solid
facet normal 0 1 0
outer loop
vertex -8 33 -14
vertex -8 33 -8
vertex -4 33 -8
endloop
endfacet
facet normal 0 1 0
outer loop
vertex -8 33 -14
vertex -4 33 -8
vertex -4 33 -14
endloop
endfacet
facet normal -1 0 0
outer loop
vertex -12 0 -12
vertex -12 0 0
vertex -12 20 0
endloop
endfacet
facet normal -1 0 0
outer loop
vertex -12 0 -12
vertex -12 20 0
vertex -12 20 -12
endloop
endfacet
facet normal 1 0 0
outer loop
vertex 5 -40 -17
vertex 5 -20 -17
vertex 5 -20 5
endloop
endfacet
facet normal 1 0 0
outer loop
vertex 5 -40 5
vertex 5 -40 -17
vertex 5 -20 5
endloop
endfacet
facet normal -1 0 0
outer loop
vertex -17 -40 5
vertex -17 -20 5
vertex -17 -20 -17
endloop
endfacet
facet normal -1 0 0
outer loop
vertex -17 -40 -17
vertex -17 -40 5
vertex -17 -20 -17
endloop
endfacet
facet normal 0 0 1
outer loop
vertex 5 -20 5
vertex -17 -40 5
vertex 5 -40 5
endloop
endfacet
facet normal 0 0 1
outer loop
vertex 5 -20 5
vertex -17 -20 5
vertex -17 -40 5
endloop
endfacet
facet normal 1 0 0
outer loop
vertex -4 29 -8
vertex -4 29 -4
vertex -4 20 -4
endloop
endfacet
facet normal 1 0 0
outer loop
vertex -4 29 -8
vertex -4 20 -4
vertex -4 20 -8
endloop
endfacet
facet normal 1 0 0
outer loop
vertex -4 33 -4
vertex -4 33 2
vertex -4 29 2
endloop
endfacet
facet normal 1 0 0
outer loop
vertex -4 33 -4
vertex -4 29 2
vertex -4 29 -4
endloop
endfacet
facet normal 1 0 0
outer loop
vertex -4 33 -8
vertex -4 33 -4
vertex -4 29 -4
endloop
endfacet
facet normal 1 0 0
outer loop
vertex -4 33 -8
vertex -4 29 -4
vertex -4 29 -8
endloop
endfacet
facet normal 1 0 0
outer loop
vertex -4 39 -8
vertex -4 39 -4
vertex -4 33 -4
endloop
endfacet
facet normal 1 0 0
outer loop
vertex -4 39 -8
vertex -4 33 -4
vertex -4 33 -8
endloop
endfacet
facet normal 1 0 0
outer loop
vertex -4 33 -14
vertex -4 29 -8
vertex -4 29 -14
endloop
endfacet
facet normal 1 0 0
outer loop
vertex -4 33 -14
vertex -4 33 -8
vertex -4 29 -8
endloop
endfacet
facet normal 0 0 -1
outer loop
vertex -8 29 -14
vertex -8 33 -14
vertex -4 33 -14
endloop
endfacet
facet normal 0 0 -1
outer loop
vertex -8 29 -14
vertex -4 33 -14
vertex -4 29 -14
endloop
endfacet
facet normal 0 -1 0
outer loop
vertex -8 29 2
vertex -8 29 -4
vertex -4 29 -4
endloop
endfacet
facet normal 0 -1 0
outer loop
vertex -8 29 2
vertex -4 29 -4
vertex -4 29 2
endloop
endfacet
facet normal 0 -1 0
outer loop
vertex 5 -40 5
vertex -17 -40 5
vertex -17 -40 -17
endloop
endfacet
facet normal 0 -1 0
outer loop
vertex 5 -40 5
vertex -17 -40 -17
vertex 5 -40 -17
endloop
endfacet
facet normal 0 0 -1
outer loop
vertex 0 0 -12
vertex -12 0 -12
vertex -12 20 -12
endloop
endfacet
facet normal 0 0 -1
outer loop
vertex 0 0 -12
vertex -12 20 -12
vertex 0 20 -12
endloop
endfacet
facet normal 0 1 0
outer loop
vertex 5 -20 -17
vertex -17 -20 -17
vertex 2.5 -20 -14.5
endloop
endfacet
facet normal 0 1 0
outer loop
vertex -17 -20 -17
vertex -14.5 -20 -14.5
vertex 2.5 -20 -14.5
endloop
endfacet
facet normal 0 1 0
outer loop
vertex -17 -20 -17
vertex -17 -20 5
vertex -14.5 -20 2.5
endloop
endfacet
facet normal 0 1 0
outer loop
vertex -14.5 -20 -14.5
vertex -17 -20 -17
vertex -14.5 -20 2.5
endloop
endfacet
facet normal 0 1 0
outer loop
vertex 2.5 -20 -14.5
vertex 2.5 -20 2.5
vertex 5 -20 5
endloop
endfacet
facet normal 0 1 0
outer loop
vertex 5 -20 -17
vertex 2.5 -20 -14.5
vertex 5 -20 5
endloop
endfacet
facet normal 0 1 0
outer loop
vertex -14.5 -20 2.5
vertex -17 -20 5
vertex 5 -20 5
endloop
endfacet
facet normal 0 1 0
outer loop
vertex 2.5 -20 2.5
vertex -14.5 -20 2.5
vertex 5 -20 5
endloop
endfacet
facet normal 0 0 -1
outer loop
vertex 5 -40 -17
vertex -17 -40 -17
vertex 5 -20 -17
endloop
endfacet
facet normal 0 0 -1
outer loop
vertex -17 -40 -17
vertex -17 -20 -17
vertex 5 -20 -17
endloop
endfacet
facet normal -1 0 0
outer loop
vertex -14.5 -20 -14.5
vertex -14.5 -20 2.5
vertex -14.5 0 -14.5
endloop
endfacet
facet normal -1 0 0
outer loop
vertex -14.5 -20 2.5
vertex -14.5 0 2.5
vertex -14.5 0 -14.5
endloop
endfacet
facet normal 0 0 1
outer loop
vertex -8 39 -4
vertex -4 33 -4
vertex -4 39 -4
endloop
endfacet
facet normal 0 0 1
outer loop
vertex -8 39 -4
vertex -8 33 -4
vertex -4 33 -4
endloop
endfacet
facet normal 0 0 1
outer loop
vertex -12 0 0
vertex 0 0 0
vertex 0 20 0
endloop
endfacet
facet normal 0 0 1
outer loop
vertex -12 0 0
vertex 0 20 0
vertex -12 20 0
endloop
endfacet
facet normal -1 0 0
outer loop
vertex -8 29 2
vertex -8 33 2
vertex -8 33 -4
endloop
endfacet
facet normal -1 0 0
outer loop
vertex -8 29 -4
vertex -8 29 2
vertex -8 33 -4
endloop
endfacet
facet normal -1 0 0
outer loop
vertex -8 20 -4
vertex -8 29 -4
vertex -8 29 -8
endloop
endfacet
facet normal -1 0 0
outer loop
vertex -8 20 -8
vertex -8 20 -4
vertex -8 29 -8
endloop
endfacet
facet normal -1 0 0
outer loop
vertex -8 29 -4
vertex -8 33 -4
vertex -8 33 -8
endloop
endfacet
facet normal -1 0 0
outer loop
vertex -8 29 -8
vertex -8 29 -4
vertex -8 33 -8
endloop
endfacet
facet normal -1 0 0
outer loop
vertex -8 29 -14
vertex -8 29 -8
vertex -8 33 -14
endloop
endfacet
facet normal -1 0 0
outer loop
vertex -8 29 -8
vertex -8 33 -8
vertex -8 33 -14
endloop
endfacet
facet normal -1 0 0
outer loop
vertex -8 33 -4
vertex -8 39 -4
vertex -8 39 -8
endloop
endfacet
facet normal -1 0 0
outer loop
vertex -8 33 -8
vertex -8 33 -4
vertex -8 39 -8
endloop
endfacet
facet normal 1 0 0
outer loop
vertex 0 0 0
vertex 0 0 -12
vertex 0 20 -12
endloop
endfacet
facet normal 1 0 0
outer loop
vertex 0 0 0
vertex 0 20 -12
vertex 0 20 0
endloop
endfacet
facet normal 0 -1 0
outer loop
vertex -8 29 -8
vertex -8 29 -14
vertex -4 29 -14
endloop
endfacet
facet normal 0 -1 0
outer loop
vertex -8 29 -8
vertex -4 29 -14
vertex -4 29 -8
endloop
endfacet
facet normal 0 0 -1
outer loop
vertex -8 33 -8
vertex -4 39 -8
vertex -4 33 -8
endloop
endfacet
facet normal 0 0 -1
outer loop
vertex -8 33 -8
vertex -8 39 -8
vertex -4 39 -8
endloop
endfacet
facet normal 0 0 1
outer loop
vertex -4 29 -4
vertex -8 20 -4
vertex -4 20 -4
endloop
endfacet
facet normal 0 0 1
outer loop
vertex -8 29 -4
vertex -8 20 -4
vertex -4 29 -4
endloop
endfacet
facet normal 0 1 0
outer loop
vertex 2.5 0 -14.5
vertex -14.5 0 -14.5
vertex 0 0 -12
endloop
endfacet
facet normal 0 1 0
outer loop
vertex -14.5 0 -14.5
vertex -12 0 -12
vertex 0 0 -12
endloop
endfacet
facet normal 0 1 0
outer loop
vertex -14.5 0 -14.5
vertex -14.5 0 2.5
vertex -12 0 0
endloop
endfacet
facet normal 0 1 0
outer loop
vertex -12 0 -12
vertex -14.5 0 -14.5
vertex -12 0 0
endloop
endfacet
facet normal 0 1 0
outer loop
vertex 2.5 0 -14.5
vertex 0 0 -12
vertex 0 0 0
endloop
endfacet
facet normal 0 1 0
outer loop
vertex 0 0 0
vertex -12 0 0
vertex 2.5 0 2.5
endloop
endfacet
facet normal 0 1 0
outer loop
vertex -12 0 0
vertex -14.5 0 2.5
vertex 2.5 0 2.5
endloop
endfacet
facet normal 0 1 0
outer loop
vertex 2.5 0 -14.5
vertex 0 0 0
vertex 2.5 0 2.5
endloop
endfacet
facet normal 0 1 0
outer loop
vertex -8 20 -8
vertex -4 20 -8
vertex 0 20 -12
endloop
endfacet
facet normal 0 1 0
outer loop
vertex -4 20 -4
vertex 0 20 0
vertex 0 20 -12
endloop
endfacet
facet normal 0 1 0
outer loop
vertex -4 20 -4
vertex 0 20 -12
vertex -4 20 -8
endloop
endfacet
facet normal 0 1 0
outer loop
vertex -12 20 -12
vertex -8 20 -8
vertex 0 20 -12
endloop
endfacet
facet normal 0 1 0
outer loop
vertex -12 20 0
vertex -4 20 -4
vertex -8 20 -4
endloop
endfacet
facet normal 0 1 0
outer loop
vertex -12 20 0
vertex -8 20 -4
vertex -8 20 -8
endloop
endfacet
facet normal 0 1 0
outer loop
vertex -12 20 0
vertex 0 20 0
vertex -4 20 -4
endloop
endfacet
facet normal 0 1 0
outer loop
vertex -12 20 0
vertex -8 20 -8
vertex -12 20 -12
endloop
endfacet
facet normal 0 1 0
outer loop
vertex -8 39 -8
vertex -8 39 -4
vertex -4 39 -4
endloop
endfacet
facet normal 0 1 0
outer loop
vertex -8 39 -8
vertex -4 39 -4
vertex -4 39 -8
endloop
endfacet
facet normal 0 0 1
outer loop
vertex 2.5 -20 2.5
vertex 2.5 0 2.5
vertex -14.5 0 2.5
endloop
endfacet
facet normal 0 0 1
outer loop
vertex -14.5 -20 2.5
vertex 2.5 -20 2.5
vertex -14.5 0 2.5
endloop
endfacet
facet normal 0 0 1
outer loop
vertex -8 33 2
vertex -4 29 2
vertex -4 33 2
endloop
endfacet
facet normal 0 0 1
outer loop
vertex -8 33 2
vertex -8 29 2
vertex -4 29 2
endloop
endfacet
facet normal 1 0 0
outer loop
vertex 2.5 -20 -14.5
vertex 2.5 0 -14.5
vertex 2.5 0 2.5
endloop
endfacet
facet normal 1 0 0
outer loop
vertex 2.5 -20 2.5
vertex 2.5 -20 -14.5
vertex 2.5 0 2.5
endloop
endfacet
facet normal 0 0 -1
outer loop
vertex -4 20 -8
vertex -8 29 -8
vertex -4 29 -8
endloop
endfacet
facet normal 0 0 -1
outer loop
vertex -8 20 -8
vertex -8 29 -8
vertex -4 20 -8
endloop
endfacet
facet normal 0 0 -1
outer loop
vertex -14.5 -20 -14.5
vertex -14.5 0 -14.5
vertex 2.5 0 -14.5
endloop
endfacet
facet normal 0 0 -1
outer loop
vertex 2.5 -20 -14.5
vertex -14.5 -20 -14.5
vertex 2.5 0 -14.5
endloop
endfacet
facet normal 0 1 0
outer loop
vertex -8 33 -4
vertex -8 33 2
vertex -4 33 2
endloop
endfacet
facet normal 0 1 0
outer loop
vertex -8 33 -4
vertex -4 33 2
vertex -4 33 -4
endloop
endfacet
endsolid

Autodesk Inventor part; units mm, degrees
ref_plane "YZ Plane" through (0, 0, 0) normal (1, 0, 0) x (0, 1, 0)
ref_plane "XZ Plane" through (0, 0, 0) normal (0, 1, 0) x (-1, 0, 0)
ref_plane "XY Plane" through (0, 0, 0) normal (0, 0, 1) x (1, 0, 0)
sketch "Sketch1" plane through (0, 0, 0) normal (0, 1, 0) x (-1, 0, 0)
  line L0 (0, 0) -> (12, 0)
  line L1 (12, 0) -> (12, -12)
  line L2 (12, -12) -> (0, -12)
  line L3 (0, -12) -> (0, 0)
  dimension "d0" = 12
  dimension "d1" = 12
extrude "Extrusion1" add sketch "Sketch1" along normal blind 20
ref_plane "Work Plane1" through (-6, 0, 0) normal (1, 0, 0) x (0, 0, -1)
sketch "Sketch2" plane through (-6, 0, 0) normal (1, 0, 0) x (0, 0, -1)
  line L0 (0, 20) -> (12, 20) projected
  line L1 (6, 20) -> (4, 20)
  line L2 (12, 20) -> (0, 20) projected
  line L3 (4, 20) -> (4, 29)
  line L4 (4, 29) -> (-2, 29)
  line L5 (-2, 29) -> (-2, 33)
  line L6 (-2, 33) -> (4, 33)
  line L7 (4, 33) -> (4, 39)
  line L8 (4, 39) -> (8, 39)
  line L9 (8, 39) -> (8, 33)
  line L10 (8, 33) -> (14, 33)
  line L11 (14, 33) -> (14, 29)
  line L12 (14, 29) -> (3, 29)
  line L13 (3, 29) -> (3, 20)
  line L14 (8, 29) -> (8, 20)
  line L15 (6, 20) -> (8, 20)
  point P0 (0, 0)
  dimension "d4" = 2
  dimension "d5" = 9
  dimension "d6" = 6
  dimension "d7" = 4
  dimension "d8" = 6
  dimension "d9" = 4
  dimension "d10" = 6
extrude "Extrusion2" add sketch "Sketch2" along normal mid plane 4 contours L3 L12 L14 L0 | L4 L5 L6 L7 L8 L9 L10 L11 L12
sketch "Sketch3" plane through (0, 0, 0) normal (0, -1, 0) x (1, 0, 0)
  line L0 (-12, 0) -> (0, 0) projected
  line L1 (0, 0) -> (0, -12) projected
  line L2 (0, 0) -> (2.5, 0)
  line L3 (2.5, 0) -> (2.5, 2.5)
  line L4 (2.5, 2.5) -> (-14.5, 2.5)
  line L5 (-14.5, 2.5) -> (-14.5, -14.5)
  line L6 (-14.5, -14.5) -> (2.5, -14.5)
  line L7 (2.5, -14.5) -> (2.5, 2.5)
  dimension "d15" = 2.5
  dimension "d16" = 2.5
  dimension "d17" = 17
  dimension "d18" = 17
extrude "Extrusion3" add sketch "Sketch3" along normal blind 20
sketch "Sketch4" plane through (0, -20, 0) normal (0, -1, 0) x (1, 0, 0)
  line L0 (2.5, -14.5) -> (2.5, 2.5) projected
  line L1 (2.5, 2.5) -> (2.5, 5)
  line L2 (2.5, 5) -> (5, 5)
  line L3 (5, 5) -> (-17, 5)
  line L4 (-17, 5) -> (-17, -17)
  line L5 (-17, -17) -> (5, -17)
  line L6 (5, -17) -> (5, 5)
  point P0 (0, 0)
  dimension "d21" = 2.5
  dimension "d22" = 2.5
  dimension "d23" = 22
  dimension "d24" = 22
extrude "Extrusion4" add sketch "Sketch4" along normal blind 20
properties part number "tiered-king"
